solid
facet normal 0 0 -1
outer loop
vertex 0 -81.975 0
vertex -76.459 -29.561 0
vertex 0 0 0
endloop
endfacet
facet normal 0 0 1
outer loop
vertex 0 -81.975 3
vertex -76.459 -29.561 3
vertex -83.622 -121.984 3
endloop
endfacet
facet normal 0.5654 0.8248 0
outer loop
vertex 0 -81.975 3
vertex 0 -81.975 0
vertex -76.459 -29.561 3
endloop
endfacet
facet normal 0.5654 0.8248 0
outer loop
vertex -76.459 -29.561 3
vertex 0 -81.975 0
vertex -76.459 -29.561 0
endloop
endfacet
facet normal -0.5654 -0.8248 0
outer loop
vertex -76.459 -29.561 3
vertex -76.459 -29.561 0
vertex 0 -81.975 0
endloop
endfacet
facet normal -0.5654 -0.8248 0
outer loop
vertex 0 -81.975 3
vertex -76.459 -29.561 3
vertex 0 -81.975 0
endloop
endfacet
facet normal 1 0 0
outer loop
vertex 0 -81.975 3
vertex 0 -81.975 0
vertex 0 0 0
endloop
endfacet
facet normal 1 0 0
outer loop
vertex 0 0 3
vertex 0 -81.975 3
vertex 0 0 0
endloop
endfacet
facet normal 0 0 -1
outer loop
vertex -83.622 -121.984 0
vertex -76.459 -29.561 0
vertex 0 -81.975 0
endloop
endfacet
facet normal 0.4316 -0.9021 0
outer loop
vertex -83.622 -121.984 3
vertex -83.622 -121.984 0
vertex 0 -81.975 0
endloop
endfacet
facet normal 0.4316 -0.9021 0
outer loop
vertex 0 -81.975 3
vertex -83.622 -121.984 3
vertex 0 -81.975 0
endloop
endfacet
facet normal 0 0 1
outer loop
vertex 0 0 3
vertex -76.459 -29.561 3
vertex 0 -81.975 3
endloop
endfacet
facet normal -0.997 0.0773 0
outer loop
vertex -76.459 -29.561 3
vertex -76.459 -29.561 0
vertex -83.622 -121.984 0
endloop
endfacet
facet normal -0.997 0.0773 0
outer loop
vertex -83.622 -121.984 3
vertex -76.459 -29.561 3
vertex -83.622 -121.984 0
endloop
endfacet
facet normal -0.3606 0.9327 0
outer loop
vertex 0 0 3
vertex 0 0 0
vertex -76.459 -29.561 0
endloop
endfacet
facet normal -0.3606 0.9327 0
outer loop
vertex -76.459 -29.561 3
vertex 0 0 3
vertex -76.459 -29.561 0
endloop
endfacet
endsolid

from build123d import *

# Parameters (mm, degrees)
F1_DEPTH = 3
F2_DEPTH = 3


with BuildPart() as f1:
    # F0 (on Top) → F1 (new body)
    with BuildSketch(Plane.XY):
        Polygon((0, -81.975), (0, 0), (-76.459487, -29.56091), align=None)
    extrude(amount=F1_DEPTH)


with BuildPart() as f2:
    # F0 (on Top) → F2 (new body)
    with BuildSketch(Plane.XY):
        Polygon((-83.621677, -121.983814), (0, -81.975), (-76.459487, -29.56091), align=None)
    extrude(amount=F2_DEPTH)


solid = Compound([f1.part, f2.part])
